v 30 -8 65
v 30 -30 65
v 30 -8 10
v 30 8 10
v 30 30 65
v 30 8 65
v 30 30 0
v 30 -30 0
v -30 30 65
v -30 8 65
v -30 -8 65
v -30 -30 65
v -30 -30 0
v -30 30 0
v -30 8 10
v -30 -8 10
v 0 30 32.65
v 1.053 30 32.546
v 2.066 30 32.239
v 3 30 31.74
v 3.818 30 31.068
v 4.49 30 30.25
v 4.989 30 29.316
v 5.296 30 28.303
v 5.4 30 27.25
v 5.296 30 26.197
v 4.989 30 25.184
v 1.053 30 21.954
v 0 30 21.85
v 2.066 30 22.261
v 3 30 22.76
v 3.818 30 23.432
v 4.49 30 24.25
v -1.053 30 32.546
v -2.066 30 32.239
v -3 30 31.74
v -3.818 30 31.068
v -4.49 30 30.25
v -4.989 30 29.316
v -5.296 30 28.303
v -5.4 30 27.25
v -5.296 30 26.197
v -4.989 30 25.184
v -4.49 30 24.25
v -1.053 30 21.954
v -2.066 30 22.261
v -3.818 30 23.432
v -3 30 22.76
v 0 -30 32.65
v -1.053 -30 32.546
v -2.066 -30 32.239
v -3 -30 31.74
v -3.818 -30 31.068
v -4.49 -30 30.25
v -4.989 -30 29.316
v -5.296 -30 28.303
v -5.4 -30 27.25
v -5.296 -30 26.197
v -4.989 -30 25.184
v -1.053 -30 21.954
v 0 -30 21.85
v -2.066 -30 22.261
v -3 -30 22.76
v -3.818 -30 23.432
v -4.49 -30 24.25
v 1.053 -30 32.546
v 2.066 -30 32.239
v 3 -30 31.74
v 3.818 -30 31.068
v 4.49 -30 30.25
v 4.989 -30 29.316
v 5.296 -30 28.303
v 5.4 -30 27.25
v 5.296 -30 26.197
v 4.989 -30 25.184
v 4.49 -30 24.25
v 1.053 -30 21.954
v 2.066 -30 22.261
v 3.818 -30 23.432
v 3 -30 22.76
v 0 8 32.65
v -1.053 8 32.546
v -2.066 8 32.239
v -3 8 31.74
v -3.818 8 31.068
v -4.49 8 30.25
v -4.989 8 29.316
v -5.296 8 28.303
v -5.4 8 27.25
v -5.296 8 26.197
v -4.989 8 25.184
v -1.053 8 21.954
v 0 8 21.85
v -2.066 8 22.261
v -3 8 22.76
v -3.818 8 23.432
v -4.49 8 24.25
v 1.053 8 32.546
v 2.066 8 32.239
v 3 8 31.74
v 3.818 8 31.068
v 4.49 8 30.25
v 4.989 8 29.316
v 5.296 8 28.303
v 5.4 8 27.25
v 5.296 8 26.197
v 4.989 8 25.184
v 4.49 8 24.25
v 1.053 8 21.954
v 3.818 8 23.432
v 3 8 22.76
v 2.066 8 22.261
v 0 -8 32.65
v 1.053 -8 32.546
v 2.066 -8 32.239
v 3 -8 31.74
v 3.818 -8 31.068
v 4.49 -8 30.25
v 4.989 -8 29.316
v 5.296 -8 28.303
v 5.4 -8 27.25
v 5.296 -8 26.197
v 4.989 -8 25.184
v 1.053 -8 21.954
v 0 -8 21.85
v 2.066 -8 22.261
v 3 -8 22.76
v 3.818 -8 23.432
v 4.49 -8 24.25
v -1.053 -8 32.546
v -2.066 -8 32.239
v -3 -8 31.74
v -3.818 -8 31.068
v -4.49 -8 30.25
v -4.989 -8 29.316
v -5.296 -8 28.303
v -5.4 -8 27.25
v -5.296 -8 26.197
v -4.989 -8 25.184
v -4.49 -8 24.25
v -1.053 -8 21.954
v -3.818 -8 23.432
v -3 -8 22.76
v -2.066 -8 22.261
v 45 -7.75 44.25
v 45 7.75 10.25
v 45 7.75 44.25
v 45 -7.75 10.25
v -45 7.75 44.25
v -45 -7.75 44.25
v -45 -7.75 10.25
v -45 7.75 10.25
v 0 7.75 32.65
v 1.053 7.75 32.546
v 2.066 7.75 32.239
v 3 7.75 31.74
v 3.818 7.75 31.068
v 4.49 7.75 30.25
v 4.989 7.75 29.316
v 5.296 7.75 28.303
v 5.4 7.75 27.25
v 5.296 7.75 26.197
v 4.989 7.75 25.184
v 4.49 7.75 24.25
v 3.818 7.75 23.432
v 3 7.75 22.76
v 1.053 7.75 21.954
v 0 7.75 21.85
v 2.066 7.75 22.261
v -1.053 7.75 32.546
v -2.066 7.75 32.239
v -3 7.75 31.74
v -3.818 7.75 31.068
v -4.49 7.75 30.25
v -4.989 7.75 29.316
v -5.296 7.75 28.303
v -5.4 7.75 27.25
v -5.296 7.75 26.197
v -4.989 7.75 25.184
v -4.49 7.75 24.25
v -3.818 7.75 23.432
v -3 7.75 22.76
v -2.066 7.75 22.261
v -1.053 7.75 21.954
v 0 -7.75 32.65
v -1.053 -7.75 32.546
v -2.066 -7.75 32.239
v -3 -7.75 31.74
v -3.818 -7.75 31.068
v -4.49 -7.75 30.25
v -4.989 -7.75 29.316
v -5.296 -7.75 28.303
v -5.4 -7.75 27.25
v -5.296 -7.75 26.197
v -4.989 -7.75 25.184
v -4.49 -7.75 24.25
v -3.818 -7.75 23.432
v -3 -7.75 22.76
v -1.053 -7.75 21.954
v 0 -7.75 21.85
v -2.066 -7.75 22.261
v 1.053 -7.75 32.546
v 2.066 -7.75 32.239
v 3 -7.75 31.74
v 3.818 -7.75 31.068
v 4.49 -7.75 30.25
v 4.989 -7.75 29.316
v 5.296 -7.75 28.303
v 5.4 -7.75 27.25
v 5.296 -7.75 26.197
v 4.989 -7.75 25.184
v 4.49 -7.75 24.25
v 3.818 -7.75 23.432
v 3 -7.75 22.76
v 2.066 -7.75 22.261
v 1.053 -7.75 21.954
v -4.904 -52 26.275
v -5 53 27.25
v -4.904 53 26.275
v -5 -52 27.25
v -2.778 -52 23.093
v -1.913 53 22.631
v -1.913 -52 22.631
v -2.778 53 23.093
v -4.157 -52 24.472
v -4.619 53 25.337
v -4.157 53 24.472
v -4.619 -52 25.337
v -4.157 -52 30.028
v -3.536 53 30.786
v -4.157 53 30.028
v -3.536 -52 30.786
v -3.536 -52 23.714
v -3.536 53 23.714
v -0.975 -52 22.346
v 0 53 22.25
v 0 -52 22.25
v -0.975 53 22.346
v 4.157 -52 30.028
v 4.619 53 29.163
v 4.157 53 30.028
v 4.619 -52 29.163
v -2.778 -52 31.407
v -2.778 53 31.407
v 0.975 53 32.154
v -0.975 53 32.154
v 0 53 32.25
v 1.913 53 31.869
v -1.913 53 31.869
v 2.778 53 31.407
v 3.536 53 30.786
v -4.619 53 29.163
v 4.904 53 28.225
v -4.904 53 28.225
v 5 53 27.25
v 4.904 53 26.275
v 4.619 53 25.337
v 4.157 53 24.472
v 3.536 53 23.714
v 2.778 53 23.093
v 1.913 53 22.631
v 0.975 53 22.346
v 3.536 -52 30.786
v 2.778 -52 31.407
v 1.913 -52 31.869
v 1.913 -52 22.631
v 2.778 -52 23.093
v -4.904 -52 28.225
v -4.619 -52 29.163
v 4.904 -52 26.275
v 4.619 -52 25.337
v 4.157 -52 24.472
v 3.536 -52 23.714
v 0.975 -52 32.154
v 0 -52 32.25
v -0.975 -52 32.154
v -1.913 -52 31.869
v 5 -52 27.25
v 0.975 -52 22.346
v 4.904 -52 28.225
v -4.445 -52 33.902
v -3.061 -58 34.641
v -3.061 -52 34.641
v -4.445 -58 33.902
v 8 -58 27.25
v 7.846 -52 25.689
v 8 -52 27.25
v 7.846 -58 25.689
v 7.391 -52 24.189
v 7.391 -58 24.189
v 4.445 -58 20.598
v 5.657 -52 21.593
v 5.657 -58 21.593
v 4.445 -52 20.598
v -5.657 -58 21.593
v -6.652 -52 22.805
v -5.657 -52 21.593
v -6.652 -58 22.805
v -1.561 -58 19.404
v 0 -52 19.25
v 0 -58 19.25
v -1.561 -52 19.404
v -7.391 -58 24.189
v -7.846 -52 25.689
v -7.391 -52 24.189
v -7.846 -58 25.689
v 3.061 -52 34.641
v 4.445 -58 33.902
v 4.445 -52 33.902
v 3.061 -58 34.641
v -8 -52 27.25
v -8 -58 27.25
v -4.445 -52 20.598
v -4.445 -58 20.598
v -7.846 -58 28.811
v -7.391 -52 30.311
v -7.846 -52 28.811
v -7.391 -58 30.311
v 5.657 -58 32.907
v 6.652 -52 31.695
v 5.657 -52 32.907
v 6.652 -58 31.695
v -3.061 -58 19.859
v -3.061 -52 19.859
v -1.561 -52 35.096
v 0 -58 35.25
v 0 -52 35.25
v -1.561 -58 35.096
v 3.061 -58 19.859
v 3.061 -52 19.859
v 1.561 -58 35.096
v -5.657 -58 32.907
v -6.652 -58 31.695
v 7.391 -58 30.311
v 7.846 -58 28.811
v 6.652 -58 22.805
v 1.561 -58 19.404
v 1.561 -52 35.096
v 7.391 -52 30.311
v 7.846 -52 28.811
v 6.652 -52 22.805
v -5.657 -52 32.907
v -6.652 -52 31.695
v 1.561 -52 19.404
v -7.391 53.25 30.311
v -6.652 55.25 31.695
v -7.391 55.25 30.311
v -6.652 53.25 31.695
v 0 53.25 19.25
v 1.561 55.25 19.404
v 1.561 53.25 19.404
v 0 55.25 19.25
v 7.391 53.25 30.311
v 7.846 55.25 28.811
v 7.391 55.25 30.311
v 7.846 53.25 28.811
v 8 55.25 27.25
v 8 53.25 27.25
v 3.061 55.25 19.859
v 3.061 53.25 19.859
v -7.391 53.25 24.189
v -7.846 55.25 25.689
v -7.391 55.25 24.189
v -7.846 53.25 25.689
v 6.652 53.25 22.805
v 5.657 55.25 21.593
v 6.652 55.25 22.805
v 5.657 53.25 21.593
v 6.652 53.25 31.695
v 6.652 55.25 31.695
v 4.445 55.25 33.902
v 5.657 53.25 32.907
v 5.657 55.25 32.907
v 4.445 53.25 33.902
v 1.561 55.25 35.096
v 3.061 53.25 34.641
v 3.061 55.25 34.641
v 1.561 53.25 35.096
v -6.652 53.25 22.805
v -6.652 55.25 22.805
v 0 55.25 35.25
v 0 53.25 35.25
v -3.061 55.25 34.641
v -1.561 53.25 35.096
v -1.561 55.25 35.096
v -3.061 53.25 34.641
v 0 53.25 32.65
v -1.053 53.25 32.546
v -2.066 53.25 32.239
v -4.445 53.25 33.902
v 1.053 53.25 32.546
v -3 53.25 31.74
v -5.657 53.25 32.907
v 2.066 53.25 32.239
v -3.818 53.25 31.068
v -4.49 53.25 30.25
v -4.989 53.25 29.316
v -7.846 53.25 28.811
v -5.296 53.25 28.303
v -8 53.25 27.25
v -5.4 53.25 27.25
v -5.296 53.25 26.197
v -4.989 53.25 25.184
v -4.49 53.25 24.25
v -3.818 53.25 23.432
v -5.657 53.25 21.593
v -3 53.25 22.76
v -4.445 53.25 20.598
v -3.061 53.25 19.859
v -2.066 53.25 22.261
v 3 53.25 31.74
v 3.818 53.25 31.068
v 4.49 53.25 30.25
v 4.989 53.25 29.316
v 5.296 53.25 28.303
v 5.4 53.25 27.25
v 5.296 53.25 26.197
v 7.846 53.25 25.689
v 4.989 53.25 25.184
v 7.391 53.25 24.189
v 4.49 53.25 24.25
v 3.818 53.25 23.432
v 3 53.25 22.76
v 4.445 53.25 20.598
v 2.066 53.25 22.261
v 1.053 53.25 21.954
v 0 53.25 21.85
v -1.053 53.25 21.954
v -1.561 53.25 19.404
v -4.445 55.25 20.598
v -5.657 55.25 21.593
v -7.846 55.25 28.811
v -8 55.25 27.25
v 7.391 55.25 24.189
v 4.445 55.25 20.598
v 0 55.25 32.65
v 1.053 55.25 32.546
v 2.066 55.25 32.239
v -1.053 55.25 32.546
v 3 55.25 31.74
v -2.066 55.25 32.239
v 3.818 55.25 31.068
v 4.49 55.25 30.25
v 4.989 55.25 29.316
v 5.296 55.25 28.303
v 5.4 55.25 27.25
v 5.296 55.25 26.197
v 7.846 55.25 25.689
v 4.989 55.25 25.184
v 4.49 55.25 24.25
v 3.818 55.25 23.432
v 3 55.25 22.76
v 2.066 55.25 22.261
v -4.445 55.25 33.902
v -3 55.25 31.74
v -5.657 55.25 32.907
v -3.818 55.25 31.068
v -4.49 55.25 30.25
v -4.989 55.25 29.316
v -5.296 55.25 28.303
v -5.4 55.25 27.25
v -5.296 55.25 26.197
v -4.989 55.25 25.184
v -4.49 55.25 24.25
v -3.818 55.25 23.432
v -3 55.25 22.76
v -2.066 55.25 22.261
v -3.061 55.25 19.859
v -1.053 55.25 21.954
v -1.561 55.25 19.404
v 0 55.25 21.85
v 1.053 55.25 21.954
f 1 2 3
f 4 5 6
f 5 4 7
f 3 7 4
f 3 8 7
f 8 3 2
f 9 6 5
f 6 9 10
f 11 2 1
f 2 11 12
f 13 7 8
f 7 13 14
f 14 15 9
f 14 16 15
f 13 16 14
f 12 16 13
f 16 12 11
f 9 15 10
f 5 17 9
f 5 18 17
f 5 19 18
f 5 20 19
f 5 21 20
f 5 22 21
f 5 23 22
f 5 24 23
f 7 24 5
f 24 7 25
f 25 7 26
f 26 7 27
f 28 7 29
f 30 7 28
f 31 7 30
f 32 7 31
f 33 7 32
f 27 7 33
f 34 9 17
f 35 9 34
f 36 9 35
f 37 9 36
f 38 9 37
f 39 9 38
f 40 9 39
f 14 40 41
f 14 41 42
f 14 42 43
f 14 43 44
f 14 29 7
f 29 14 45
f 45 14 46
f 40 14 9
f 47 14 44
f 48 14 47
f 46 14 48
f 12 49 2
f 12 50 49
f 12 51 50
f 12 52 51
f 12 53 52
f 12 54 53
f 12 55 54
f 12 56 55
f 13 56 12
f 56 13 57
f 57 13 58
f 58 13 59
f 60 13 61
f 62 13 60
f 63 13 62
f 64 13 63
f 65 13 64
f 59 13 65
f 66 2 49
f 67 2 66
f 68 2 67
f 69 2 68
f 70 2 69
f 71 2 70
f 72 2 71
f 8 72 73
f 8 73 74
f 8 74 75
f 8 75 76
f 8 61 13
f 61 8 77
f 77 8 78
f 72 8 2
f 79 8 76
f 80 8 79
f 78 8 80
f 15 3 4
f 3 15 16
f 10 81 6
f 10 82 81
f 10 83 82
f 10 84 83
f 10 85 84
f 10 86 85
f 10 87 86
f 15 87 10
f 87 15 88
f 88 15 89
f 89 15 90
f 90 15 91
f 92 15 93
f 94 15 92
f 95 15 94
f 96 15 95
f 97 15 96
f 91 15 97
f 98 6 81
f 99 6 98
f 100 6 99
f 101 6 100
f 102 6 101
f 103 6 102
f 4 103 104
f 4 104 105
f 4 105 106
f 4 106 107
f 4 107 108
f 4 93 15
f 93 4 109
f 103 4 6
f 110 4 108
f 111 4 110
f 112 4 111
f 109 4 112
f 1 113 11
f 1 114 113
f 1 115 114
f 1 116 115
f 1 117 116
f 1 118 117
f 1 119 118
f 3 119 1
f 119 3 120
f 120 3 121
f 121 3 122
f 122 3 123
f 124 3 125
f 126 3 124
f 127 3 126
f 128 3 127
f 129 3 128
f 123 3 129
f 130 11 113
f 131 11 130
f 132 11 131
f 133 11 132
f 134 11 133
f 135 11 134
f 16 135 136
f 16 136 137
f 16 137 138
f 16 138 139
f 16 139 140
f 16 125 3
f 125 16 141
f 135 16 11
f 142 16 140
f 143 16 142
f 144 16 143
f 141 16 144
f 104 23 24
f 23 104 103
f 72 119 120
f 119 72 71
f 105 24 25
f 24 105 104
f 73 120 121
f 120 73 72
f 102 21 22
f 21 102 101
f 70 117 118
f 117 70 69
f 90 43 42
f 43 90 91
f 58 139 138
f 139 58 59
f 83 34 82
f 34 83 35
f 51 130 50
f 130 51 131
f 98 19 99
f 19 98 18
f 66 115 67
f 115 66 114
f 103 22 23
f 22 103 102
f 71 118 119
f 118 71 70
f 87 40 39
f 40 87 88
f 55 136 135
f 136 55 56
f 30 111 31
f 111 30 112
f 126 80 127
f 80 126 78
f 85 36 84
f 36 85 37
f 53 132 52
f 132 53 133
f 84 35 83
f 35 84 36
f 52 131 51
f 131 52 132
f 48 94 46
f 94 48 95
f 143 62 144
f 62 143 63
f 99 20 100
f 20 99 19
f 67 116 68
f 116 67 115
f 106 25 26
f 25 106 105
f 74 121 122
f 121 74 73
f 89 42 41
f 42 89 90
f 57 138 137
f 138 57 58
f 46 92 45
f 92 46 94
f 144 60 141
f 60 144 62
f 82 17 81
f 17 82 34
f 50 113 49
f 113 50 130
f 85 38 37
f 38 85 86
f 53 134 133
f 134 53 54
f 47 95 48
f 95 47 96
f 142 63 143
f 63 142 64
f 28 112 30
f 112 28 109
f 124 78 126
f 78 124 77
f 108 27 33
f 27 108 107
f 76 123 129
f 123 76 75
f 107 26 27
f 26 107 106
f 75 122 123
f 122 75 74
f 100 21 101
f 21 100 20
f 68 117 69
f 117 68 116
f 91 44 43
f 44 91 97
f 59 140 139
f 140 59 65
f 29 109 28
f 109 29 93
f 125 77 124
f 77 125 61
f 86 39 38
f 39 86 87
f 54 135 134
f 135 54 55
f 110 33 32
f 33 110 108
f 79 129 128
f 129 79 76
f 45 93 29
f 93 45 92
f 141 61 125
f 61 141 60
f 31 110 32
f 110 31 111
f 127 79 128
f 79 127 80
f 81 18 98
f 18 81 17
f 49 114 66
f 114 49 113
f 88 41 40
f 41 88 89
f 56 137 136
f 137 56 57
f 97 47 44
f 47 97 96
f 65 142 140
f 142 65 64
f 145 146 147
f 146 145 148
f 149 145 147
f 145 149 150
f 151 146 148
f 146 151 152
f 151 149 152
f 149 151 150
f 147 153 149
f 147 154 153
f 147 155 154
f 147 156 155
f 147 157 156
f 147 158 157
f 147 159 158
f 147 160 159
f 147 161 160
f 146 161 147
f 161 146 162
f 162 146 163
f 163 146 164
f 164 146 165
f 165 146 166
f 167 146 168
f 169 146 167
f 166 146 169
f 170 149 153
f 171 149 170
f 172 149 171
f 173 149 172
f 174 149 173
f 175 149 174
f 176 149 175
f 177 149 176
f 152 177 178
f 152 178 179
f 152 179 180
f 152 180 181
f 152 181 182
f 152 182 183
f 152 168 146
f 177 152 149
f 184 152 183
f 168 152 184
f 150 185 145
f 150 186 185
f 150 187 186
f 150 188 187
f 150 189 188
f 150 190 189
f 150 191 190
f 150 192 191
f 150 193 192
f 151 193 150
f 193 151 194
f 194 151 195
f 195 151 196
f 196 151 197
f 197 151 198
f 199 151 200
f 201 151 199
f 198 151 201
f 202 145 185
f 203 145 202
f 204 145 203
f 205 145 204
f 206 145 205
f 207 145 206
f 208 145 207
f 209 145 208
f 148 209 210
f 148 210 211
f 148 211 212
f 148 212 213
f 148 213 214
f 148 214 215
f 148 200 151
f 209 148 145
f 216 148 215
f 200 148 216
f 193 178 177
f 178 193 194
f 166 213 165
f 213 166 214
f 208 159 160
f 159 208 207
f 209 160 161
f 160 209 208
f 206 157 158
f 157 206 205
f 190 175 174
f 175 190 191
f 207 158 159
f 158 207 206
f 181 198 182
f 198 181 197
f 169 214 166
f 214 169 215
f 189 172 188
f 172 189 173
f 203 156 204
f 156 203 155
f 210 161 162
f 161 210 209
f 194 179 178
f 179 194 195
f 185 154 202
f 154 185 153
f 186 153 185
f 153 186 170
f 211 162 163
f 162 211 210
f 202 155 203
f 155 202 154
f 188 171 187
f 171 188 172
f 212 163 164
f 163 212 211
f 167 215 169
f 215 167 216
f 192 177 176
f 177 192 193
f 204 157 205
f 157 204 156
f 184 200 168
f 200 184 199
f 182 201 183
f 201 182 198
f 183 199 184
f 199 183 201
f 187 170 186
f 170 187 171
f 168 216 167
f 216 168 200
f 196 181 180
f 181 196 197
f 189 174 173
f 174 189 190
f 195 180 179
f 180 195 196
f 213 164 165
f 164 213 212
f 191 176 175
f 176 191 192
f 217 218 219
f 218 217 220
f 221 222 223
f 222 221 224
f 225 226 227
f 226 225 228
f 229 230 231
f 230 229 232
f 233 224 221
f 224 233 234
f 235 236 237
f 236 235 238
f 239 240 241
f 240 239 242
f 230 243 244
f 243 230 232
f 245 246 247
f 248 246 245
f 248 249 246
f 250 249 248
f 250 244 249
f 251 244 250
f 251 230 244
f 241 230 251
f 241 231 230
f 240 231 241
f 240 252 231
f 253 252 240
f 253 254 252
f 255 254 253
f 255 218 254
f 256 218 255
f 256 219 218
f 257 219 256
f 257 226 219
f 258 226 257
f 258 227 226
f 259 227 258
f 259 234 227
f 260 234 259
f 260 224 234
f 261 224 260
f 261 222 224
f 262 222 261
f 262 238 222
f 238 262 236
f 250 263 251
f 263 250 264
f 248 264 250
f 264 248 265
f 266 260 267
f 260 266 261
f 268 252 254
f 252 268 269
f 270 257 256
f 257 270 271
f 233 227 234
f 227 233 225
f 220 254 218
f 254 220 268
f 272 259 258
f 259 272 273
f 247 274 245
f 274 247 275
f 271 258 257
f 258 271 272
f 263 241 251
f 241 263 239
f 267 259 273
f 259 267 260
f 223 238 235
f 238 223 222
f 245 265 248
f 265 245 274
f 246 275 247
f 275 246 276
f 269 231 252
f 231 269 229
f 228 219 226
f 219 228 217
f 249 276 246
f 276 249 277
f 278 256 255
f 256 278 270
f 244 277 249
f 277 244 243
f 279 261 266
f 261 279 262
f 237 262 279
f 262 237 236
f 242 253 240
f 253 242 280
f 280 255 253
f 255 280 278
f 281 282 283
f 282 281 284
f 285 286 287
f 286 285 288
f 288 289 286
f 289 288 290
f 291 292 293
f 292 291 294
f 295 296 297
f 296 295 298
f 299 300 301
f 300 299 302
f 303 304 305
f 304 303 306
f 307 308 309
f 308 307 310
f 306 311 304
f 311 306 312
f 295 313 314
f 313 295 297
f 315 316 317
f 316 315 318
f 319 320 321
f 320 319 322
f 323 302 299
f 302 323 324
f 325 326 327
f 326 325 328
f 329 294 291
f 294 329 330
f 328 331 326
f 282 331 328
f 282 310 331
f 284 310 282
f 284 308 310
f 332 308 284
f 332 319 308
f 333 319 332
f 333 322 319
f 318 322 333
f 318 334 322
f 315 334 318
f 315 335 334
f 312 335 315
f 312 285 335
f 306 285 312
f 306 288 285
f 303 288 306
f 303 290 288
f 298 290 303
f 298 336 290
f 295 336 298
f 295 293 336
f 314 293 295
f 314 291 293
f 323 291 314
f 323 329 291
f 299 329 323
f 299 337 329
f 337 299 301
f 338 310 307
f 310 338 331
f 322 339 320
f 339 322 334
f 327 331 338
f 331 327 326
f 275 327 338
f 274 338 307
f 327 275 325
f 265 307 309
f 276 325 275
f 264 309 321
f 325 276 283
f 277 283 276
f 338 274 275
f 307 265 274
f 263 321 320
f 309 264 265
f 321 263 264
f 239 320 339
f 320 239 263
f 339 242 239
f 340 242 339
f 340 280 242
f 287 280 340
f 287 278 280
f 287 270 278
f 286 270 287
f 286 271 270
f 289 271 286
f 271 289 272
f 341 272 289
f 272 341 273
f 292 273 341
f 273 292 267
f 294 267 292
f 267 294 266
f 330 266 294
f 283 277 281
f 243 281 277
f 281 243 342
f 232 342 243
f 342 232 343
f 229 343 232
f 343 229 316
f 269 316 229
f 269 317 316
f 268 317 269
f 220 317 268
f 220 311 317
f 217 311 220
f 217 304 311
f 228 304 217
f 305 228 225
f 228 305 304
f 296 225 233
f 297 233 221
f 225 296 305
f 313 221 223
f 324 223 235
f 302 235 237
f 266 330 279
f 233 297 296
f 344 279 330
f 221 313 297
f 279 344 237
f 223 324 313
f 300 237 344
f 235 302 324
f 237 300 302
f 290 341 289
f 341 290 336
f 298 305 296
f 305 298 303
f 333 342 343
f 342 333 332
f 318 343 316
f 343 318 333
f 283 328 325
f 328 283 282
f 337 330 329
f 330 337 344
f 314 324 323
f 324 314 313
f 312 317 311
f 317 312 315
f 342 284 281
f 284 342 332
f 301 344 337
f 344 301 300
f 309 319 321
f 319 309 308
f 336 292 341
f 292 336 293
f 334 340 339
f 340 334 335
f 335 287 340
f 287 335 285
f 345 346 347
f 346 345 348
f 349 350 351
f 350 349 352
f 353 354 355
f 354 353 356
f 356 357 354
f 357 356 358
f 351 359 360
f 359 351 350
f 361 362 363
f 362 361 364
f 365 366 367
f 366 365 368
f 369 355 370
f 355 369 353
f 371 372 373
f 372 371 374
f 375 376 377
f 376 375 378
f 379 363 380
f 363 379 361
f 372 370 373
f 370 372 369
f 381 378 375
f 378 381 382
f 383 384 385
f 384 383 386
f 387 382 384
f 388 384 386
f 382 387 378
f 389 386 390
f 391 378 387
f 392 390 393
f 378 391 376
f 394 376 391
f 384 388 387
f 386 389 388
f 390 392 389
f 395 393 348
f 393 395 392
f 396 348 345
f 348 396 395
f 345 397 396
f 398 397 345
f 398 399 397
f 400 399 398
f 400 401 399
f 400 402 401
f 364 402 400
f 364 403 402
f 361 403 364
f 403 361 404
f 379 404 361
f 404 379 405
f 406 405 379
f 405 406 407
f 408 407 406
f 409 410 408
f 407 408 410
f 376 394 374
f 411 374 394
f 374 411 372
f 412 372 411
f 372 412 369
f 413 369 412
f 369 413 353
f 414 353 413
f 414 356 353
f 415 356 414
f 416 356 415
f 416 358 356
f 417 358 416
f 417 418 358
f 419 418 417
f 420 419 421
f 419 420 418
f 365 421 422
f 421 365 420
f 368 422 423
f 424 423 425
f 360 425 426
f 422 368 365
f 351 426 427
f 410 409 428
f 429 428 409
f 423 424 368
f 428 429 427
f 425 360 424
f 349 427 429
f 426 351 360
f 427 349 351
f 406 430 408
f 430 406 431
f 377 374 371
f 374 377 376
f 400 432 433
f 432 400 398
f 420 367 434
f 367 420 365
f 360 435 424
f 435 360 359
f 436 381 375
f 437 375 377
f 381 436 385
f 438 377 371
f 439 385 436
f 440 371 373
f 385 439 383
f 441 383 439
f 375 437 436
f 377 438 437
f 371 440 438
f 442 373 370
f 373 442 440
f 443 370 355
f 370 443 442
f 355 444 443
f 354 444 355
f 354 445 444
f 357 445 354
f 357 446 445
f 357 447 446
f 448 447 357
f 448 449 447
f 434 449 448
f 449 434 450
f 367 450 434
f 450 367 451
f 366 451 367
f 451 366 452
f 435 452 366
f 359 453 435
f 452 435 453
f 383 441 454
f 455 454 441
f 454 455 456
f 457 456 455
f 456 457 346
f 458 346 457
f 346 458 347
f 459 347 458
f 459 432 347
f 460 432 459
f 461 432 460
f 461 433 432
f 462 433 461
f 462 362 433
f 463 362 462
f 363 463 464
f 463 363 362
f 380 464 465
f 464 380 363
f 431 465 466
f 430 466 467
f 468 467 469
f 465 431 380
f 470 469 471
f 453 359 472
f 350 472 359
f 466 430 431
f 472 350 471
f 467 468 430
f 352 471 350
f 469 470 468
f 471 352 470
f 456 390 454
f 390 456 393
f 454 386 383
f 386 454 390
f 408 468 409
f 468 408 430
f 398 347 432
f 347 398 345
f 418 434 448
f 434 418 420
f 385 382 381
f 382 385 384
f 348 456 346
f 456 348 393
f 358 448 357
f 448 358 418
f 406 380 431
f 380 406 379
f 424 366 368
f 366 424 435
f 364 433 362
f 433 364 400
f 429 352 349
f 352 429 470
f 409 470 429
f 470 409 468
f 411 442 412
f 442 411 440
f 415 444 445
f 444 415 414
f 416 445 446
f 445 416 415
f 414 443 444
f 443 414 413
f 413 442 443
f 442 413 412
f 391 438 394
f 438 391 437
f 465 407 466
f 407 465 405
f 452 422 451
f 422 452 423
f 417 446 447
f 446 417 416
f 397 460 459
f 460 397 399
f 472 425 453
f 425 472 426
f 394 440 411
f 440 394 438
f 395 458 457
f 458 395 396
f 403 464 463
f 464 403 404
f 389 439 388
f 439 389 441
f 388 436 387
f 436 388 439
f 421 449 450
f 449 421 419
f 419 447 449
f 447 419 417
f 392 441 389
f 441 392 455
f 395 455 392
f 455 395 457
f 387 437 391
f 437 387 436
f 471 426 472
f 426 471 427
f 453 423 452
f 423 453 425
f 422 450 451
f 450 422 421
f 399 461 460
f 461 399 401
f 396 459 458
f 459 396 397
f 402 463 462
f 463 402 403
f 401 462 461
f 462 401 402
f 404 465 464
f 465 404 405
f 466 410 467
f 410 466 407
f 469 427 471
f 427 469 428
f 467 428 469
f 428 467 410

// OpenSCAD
$fn = 32;

// ------------------------------------------------------------------------
// Clevis joint: 60 mm clevis, pin d10
// Every part is its own module, assembly() places them once.
// ------------------------------------------------------------------------

// --- part 1 ---
module clevis() {
  difference() {
    translate([-30, -30, 0]) cube([60, 60, 65]);
    translate([-31, -8, 10]) cube([62, 16, 56]);
    translate([0, 0, 27.25]) rotate([90, 0, 0]) cylinder(h = 62, d = 10.8, center = true);
  }
}

// --- part 2 ---
module eye() {
  difference() {
    translate([-45, -7.75, 0]) cube([90, 15.5, 34]);
    translate([0, 0, 17]) rotate([90, 0, 0]) cylinder(h = 17.5, d = 10.8, center = true);
  }
}

// --- part 3 ---
module pin() {
  rotate([0, 90, 0]) cylinder(h = 106, d = 10, center = true);
  translate([-58, 0, 0]) rotate([0, 90, 0]) cylinder(h = 6, d = 16);
}

// --- part 4 ---
module retainer() {
  difference() {
      translate([0, 0, 0]) cylinder(h = 2, d = 16);
      translate([0, 0, -1]) cylinder(h = 4, d = 10.8);
    }
}

// --- assembly ---
module assembly() {
  translate([0, 0, 0]) rotate([0, 0, 0]) clevis();
  translate([0, 0, 10.25]) rotate([0, 0, 0]) eye();
  translate([0, 0, 27.25]) rotate([0, 0, 90]) pin();
  translate([0, 55.25, 27.25]) rotate([90, 0, 0]) retainer();
}

assembly();
